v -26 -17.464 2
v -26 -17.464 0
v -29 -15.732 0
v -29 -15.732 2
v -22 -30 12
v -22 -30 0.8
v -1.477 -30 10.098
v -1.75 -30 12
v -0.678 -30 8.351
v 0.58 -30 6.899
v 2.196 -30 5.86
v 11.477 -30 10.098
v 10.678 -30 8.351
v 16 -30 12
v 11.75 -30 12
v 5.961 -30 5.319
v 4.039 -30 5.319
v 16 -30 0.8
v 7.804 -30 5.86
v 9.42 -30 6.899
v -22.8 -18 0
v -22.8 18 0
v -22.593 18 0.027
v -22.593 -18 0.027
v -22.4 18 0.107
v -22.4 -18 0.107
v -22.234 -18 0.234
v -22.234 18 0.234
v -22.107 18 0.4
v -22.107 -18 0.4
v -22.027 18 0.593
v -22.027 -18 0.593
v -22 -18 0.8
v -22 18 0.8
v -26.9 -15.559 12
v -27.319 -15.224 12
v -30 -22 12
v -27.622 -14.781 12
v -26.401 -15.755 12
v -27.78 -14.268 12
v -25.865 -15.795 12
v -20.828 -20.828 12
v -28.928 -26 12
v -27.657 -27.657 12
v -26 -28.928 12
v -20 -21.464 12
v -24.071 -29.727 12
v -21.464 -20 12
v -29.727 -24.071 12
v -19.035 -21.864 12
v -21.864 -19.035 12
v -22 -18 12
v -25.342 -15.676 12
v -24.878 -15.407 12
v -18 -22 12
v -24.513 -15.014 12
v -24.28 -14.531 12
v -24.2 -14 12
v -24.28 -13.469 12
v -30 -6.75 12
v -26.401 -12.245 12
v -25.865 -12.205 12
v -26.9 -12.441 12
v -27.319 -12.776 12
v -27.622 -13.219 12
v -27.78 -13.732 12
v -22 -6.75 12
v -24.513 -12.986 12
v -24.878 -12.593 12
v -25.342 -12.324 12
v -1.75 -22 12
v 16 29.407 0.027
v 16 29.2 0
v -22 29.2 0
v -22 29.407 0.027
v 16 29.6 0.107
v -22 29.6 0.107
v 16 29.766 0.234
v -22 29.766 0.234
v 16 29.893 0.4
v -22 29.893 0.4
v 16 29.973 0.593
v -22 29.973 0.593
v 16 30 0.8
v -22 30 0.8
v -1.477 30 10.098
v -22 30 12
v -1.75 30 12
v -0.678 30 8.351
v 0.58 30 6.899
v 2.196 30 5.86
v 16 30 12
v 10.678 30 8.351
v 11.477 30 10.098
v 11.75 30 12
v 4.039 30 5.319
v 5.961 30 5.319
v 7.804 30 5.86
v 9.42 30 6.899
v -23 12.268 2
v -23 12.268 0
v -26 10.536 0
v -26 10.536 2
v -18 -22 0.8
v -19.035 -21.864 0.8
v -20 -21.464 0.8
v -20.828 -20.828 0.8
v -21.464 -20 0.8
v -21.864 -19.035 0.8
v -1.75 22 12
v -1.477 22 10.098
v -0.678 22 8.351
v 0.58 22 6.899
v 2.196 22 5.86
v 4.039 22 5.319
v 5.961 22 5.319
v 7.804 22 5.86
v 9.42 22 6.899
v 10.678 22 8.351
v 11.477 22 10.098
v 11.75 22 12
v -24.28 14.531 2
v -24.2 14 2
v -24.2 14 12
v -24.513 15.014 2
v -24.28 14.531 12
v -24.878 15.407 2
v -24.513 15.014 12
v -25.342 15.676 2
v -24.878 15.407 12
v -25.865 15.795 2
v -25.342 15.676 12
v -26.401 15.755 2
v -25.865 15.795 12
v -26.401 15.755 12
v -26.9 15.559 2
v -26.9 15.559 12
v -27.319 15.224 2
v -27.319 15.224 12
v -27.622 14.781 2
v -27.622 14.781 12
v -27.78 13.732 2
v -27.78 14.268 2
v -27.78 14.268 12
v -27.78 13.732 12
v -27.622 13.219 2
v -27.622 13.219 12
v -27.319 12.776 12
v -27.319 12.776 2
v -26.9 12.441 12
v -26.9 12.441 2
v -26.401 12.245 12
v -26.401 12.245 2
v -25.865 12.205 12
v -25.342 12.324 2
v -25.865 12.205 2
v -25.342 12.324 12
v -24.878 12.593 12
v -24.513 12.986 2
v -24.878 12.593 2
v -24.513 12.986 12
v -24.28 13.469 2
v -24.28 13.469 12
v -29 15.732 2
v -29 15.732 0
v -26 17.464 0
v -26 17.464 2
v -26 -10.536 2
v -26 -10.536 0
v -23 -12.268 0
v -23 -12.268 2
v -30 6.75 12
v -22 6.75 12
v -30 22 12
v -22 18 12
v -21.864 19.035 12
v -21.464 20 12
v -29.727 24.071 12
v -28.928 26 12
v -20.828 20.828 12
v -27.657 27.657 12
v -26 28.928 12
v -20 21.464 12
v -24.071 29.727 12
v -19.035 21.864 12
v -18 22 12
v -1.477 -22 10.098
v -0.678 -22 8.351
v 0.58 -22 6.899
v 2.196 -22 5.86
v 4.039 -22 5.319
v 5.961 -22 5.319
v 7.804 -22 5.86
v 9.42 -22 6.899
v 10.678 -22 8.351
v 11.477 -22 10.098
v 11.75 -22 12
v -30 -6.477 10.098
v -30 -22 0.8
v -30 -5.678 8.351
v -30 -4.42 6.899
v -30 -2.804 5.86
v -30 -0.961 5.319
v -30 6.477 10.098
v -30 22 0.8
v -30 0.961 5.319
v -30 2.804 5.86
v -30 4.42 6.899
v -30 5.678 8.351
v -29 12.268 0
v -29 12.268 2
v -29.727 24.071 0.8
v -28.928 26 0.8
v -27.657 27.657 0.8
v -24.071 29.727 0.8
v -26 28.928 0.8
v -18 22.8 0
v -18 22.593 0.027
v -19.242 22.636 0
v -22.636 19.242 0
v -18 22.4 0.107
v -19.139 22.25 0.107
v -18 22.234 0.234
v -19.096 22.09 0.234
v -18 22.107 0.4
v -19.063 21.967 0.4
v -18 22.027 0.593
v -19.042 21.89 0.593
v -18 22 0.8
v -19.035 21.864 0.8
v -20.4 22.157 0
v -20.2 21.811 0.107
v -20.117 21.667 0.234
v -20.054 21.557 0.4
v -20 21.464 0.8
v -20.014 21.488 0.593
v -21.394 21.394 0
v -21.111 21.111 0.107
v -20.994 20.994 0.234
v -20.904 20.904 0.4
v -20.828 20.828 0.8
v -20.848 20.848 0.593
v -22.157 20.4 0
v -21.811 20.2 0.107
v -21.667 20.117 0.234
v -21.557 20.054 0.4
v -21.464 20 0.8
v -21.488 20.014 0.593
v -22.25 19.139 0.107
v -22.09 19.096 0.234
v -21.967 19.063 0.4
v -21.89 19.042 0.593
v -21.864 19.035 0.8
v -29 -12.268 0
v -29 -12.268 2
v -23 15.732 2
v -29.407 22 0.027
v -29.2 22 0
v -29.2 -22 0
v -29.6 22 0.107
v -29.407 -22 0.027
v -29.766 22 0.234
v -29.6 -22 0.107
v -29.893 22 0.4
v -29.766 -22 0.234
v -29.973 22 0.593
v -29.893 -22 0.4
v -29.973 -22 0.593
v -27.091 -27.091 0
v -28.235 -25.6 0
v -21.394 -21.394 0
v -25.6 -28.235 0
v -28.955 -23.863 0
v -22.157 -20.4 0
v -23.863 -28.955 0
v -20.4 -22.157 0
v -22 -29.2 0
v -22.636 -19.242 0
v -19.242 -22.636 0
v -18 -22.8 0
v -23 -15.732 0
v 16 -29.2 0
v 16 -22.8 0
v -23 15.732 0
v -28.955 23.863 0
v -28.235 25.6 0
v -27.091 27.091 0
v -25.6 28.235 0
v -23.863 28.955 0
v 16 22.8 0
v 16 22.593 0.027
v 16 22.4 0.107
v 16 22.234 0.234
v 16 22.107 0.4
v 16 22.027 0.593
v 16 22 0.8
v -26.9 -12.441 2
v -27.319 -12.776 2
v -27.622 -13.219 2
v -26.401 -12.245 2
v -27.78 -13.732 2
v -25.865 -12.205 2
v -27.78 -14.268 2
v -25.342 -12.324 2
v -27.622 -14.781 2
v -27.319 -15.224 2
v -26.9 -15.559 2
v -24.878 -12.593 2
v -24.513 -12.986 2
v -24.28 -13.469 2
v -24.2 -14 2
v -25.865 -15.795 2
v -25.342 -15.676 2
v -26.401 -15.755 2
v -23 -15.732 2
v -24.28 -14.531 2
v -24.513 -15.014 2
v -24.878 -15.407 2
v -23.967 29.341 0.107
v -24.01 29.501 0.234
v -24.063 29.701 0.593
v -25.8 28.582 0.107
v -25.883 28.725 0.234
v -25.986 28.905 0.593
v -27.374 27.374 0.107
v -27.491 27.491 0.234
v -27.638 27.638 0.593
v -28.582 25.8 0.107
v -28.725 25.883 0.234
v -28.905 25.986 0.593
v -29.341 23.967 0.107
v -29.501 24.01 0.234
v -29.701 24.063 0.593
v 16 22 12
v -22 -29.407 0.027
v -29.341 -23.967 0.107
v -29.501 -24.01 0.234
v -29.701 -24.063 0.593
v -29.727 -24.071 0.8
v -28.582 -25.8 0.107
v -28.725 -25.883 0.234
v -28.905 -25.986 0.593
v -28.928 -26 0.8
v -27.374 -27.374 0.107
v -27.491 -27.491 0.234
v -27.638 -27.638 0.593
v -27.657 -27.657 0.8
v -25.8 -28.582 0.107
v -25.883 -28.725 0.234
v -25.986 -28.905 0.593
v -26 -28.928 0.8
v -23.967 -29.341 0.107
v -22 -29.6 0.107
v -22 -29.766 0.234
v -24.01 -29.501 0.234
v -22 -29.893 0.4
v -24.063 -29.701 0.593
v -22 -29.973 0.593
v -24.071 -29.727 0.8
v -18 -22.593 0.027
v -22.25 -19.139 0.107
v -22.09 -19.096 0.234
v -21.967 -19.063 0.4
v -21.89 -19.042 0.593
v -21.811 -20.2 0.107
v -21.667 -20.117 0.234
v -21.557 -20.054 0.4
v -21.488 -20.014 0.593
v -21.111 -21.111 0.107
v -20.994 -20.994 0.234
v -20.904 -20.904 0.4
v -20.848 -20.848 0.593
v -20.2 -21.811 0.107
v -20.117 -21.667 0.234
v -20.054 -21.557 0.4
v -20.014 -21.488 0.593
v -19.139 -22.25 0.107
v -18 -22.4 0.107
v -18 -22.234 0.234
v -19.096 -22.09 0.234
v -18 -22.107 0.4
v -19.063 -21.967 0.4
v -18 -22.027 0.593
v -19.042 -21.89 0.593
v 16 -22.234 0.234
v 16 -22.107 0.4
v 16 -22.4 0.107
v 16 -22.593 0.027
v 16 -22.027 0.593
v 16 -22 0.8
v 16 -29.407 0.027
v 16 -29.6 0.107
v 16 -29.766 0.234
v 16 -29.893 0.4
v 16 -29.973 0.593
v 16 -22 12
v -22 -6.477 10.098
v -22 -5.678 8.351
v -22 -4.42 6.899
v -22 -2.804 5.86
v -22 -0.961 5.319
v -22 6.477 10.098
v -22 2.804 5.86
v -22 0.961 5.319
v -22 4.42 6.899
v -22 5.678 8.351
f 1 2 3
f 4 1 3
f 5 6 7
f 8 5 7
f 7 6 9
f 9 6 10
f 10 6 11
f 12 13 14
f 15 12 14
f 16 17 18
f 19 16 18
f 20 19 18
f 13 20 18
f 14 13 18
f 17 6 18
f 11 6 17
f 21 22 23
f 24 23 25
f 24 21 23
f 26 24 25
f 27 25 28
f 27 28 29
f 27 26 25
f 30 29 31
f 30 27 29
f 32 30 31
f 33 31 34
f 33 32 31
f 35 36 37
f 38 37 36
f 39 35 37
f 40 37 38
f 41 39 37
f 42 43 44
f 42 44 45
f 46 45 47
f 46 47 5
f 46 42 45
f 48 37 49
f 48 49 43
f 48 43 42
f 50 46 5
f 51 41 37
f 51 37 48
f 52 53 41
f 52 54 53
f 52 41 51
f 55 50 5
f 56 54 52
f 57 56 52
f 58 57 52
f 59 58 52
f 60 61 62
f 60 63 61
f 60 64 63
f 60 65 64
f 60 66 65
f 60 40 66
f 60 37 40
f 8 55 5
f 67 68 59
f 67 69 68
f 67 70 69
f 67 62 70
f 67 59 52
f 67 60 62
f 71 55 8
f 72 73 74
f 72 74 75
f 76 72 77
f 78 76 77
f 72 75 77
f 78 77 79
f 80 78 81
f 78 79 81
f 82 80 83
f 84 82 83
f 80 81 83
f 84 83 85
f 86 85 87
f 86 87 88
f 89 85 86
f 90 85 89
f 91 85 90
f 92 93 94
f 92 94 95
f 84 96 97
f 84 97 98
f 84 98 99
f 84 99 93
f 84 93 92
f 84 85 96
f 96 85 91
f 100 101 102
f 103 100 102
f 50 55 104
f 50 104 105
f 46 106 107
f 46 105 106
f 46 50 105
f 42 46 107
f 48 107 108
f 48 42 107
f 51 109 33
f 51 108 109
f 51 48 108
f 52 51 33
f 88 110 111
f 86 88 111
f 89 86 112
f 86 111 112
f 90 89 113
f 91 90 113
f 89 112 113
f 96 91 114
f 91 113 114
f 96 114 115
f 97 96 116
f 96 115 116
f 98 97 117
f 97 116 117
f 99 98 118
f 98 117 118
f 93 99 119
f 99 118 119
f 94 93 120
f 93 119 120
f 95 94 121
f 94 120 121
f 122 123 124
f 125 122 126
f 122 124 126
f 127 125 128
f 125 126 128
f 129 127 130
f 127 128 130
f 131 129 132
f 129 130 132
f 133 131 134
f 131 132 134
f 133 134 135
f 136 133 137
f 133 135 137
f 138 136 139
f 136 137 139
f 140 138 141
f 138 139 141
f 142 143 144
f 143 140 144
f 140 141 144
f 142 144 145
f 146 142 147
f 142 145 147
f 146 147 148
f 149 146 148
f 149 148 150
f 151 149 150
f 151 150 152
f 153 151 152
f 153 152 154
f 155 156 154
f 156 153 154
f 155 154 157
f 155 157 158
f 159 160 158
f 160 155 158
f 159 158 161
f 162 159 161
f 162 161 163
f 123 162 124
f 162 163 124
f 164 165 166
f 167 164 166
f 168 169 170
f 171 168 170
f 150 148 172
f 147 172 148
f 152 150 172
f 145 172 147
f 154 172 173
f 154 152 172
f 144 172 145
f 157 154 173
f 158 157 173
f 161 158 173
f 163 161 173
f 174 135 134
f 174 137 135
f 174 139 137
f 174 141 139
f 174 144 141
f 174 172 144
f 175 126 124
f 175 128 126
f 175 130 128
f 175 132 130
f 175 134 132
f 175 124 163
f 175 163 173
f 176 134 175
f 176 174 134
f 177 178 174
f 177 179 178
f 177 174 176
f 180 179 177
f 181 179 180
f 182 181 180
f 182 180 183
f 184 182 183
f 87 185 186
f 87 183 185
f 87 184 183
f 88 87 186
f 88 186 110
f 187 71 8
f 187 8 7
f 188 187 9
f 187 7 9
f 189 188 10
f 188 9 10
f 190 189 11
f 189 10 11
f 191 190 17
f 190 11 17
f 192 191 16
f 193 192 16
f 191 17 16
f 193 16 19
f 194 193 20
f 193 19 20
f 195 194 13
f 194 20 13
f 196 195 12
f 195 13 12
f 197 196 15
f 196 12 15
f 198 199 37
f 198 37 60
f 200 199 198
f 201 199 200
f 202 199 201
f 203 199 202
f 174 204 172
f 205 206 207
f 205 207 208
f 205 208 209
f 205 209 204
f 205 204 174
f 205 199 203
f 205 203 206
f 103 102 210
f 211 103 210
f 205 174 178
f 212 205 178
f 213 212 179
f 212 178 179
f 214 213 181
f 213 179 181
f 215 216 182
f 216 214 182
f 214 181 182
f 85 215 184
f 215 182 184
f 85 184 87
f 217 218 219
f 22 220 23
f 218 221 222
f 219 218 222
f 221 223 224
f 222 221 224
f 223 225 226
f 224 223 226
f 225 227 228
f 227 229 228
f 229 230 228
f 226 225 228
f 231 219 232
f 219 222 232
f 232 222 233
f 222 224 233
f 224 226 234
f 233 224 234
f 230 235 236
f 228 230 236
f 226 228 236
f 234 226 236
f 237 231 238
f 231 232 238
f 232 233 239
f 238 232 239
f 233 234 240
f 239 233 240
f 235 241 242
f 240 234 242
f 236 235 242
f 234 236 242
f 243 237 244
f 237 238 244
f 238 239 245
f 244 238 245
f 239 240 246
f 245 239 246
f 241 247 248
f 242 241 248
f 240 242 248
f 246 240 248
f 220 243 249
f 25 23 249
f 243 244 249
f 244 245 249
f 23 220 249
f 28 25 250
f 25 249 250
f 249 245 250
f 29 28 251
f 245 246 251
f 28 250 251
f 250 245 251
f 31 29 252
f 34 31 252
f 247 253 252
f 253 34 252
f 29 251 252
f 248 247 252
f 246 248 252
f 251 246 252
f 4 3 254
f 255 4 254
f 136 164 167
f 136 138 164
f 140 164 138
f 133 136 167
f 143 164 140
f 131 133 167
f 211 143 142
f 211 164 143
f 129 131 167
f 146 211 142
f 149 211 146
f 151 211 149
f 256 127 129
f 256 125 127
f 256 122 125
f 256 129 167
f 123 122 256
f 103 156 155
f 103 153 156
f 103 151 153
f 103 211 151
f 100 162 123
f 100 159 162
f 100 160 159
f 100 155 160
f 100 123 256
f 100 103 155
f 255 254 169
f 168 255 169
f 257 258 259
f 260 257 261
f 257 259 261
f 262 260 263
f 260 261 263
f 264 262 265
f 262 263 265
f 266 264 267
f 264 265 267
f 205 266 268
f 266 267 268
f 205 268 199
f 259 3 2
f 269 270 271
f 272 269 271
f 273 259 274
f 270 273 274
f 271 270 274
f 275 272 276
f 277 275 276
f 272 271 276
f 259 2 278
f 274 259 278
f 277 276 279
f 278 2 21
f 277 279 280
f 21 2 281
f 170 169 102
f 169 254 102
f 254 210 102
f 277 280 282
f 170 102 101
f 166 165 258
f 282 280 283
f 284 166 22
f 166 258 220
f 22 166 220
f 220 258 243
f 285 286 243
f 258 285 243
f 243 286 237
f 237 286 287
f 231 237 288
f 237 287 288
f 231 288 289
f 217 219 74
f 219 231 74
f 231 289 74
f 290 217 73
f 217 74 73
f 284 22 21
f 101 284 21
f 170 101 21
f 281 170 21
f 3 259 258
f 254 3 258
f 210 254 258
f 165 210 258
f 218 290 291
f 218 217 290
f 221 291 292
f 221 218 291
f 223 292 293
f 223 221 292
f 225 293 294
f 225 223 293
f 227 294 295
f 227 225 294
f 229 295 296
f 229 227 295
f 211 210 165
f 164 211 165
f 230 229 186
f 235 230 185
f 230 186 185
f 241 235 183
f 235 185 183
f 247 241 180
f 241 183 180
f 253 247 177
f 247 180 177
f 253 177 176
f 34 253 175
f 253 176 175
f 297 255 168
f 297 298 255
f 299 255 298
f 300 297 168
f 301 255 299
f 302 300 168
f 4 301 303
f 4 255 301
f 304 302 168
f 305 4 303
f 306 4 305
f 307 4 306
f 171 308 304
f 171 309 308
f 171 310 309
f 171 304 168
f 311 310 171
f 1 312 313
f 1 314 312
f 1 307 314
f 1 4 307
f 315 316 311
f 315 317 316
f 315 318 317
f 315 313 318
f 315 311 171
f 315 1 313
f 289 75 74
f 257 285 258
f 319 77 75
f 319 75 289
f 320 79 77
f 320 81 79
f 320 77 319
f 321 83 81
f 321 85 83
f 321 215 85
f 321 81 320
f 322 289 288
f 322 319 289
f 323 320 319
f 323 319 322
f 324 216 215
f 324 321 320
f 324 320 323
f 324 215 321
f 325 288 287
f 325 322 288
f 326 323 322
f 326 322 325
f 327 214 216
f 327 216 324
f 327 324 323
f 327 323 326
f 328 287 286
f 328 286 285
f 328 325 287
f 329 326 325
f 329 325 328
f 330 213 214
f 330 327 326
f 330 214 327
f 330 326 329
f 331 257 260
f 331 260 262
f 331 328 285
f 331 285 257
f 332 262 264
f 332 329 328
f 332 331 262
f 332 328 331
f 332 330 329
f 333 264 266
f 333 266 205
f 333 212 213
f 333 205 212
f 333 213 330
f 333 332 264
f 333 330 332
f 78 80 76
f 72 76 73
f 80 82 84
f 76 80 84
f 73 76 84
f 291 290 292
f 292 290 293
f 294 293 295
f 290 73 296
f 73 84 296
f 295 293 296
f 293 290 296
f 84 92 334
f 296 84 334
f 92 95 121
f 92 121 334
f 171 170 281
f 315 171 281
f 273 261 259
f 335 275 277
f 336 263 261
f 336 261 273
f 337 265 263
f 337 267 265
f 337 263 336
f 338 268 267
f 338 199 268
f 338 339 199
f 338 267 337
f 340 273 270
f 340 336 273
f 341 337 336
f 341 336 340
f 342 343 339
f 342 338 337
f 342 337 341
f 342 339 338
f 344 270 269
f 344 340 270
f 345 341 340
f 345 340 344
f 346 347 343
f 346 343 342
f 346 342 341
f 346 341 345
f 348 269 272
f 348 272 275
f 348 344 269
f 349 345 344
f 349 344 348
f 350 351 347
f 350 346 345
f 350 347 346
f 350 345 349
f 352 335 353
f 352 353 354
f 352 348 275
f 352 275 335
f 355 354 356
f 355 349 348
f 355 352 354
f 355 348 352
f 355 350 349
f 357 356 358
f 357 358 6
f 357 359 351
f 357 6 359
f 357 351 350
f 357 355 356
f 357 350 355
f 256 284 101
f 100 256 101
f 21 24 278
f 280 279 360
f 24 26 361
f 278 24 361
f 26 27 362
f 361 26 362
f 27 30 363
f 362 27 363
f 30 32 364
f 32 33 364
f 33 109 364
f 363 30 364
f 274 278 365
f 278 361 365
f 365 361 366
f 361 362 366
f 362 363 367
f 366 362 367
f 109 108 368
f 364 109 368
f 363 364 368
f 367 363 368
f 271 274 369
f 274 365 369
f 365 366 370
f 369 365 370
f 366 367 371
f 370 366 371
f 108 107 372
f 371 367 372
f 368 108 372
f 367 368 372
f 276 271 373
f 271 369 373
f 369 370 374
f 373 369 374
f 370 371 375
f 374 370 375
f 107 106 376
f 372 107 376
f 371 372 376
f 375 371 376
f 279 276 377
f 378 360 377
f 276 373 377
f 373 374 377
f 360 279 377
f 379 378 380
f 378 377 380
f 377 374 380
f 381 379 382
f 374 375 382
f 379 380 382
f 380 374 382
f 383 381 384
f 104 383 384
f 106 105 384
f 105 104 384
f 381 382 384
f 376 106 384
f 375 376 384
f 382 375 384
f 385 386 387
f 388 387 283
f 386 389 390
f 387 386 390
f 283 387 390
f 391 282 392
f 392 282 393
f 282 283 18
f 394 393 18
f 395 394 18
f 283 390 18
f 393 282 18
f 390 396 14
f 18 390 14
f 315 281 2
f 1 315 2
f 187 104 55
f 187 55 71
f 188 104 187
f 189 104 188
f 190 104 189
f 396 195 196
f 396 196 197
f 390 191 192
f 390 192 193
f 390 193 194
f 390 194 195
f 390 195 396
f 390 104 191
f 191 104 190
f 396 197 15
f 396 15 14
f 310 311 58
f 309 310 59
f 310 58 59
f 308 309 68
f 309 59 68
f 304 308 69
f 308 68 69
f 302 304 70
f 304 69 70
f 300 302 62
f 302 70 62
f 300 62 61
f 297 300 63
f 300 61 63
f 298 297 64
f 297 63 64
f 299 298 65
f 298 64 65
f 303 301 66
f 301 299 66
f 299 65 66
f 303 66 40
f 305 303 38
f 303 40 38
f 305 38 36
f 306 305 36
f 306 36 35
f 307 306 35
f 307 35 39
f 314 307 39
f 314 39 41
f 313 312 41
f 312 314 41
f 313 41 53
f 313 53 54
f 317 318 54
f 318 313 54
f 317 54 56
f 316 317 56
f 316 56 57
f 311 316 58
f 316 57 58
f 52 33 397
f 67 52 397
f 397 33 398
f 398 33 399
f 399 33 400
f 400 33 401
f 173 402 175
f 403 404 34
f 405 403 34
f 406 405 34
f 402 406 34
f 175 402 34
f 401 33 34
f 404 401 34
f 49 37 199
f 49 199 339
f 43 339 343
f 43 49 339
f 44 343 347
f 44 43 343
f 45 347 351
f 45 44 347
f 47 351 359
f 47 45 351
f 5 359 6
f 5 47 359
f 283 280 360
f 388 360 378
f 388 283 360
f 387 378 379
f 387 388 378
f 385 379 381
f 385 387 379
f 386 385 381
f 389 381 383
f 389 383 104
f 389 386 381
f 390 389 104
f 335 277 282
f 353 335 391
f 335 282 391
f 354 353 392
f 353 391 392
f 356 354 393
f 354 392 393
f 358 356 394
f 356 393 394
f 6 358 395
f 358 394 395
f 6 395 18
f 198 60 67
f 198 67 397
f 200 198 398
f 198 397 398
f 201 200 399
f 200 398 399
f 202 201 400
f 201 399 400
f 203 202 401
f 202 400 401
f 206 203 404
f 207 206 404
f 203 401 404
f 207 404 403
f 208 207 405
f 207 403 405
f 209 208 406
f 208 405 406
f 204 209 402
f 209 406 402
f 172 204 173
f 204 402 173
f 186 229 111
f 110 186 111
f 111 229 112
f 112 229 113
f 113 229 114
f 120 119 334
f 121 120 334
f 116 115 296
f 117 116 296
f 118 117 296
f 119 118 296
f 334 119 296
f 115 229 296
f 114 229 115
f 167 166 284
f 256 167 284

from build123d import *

# Parameters (mm, degrees)
F0_W      = 60
F0_H      = 60
F0_W_2    = 44
F0_H_2    = 44
F1_DEPTH  = 12
F3_DEPTH  = 25
F4_R      = 8
F5_R      = 4
F7_DEPTH  = 25
F9_DEPTH  = 60.001
F10_R     = 1.8
F11_DEPTH = 25
F12_R     = 0.8
F13_R     = 1.8
F14_DEPTH = 2


# Not quite as in the source:
# - a feature names something its author has since deleted; it is built from what else it names


with BuildPart() as f1:
    # F0 (on Top) → F1 (new body)
    with BuildSketch(Plane.XY):
        Rectangle(F0_W, F0_H)
        Rectangle(F0_W_2, F0_H_2, mode=Mode.SUBTRACT)
    extrude(amount=F1_DEPTH)

    # F2 (on face) → F3 (cut)
    with BuildSketch(Plane.XY.offset(12)):
        Polygon((30, -30), (30, 30), (16, 30), (16, 22), (22, 22), (22, -22), (16, -22), (16, -30), align=None)
    extrude(amount=-F3_DEPTH, mode=Mode.SUBTRACT)

    # F4
    f4_edges = [f1.edges().sort_by_distance(p)[0] for p in [
        (-30, -30, 6),
        (-30, 30, 6),
    ]]
    fillet(f4_edges, radius=F4_R)

    # F5
    f5_edges = [f1.edges().sort_by_distance(p)[0] for p in [
        (-22, 22, 6),
        (-22, -22, 6),
    ]]
    fillet(f5_edges, radius=F5_R)

    # F6 (on face) → F7 (cut)
    with BuildSketch(Plane.YZ.offset(-22)):
        with BuildLine():
            ThreePointArc((-6.75, 12), (0, 5.25), (6.75, 12))
            Line((6.75, 12), (-6.75, 12))
        make_face()
    extrude(amount=-F7_DEPTH, mode=Mode.SUBTRACT)

    # F8 (on face) → F9 (cut, through all)
    with BuildSketch(Plane.XZ.offset(30)):
        with BuildLine():
            ThreePointArc((-1.75, 12), (5, 5.25), (11.75, 12))
            Line((11.75, 12), (-1.75, 12))
        make_face()
    extrude(amount=-F9_DEPTH, mode=Mode.SUBTRACT)

    # F10 (on face) → F11 (cut)
    with BuildSketch(Plane.XY.offset(12)):
        with Locations((-26, 14)):
            Circle(F10_R)
        with Locations((-26, -14)):
            Circle(F10_R)
    extrude(amount=-F11_DEPTH, mode=Mode.SUBTRACT)

    # F12
    f12_edges = [f1.edges().sort_by_distance(p)[0] for p in [
        (-3, -30, 0),
        (-20.828427, 20.828427, 0),
    ]]
    fillet(f12_edges, radius=F12_R)

    # F13 (on face) → F14 (cut)
    with BuildSketch(Plane(origin=(0, 0, 0), x_dir=(1, 0, 0), z_dir=(0, 0, -1))):
        Polygon((-23, 12.2679491924), (-23, 15.7320508076), (-26, 17.4641016151), (-29, 15.7320508076), (-29, 12.2679491924), (-26, 10.5358983849), align=None)
        with Locations((-26, 14)):
            Circle(F13_R, mode=Mode.SUBTRACT)
        Polygon((-26, -17.4641016151), (-23, -15.7320508076), (-23, -12.2679491924), (-26, -10.5358983849), (-29, -12.2679491924), (-29, -15.7320508076), align=None)
        with Locations((-26, -14)):
            Circle(F13_R, mode=Mode.SUBTRACT)
    extrude(amount=-F14_DEPTH, mode=Mode.SUBTRACT)


solid = f1.part
